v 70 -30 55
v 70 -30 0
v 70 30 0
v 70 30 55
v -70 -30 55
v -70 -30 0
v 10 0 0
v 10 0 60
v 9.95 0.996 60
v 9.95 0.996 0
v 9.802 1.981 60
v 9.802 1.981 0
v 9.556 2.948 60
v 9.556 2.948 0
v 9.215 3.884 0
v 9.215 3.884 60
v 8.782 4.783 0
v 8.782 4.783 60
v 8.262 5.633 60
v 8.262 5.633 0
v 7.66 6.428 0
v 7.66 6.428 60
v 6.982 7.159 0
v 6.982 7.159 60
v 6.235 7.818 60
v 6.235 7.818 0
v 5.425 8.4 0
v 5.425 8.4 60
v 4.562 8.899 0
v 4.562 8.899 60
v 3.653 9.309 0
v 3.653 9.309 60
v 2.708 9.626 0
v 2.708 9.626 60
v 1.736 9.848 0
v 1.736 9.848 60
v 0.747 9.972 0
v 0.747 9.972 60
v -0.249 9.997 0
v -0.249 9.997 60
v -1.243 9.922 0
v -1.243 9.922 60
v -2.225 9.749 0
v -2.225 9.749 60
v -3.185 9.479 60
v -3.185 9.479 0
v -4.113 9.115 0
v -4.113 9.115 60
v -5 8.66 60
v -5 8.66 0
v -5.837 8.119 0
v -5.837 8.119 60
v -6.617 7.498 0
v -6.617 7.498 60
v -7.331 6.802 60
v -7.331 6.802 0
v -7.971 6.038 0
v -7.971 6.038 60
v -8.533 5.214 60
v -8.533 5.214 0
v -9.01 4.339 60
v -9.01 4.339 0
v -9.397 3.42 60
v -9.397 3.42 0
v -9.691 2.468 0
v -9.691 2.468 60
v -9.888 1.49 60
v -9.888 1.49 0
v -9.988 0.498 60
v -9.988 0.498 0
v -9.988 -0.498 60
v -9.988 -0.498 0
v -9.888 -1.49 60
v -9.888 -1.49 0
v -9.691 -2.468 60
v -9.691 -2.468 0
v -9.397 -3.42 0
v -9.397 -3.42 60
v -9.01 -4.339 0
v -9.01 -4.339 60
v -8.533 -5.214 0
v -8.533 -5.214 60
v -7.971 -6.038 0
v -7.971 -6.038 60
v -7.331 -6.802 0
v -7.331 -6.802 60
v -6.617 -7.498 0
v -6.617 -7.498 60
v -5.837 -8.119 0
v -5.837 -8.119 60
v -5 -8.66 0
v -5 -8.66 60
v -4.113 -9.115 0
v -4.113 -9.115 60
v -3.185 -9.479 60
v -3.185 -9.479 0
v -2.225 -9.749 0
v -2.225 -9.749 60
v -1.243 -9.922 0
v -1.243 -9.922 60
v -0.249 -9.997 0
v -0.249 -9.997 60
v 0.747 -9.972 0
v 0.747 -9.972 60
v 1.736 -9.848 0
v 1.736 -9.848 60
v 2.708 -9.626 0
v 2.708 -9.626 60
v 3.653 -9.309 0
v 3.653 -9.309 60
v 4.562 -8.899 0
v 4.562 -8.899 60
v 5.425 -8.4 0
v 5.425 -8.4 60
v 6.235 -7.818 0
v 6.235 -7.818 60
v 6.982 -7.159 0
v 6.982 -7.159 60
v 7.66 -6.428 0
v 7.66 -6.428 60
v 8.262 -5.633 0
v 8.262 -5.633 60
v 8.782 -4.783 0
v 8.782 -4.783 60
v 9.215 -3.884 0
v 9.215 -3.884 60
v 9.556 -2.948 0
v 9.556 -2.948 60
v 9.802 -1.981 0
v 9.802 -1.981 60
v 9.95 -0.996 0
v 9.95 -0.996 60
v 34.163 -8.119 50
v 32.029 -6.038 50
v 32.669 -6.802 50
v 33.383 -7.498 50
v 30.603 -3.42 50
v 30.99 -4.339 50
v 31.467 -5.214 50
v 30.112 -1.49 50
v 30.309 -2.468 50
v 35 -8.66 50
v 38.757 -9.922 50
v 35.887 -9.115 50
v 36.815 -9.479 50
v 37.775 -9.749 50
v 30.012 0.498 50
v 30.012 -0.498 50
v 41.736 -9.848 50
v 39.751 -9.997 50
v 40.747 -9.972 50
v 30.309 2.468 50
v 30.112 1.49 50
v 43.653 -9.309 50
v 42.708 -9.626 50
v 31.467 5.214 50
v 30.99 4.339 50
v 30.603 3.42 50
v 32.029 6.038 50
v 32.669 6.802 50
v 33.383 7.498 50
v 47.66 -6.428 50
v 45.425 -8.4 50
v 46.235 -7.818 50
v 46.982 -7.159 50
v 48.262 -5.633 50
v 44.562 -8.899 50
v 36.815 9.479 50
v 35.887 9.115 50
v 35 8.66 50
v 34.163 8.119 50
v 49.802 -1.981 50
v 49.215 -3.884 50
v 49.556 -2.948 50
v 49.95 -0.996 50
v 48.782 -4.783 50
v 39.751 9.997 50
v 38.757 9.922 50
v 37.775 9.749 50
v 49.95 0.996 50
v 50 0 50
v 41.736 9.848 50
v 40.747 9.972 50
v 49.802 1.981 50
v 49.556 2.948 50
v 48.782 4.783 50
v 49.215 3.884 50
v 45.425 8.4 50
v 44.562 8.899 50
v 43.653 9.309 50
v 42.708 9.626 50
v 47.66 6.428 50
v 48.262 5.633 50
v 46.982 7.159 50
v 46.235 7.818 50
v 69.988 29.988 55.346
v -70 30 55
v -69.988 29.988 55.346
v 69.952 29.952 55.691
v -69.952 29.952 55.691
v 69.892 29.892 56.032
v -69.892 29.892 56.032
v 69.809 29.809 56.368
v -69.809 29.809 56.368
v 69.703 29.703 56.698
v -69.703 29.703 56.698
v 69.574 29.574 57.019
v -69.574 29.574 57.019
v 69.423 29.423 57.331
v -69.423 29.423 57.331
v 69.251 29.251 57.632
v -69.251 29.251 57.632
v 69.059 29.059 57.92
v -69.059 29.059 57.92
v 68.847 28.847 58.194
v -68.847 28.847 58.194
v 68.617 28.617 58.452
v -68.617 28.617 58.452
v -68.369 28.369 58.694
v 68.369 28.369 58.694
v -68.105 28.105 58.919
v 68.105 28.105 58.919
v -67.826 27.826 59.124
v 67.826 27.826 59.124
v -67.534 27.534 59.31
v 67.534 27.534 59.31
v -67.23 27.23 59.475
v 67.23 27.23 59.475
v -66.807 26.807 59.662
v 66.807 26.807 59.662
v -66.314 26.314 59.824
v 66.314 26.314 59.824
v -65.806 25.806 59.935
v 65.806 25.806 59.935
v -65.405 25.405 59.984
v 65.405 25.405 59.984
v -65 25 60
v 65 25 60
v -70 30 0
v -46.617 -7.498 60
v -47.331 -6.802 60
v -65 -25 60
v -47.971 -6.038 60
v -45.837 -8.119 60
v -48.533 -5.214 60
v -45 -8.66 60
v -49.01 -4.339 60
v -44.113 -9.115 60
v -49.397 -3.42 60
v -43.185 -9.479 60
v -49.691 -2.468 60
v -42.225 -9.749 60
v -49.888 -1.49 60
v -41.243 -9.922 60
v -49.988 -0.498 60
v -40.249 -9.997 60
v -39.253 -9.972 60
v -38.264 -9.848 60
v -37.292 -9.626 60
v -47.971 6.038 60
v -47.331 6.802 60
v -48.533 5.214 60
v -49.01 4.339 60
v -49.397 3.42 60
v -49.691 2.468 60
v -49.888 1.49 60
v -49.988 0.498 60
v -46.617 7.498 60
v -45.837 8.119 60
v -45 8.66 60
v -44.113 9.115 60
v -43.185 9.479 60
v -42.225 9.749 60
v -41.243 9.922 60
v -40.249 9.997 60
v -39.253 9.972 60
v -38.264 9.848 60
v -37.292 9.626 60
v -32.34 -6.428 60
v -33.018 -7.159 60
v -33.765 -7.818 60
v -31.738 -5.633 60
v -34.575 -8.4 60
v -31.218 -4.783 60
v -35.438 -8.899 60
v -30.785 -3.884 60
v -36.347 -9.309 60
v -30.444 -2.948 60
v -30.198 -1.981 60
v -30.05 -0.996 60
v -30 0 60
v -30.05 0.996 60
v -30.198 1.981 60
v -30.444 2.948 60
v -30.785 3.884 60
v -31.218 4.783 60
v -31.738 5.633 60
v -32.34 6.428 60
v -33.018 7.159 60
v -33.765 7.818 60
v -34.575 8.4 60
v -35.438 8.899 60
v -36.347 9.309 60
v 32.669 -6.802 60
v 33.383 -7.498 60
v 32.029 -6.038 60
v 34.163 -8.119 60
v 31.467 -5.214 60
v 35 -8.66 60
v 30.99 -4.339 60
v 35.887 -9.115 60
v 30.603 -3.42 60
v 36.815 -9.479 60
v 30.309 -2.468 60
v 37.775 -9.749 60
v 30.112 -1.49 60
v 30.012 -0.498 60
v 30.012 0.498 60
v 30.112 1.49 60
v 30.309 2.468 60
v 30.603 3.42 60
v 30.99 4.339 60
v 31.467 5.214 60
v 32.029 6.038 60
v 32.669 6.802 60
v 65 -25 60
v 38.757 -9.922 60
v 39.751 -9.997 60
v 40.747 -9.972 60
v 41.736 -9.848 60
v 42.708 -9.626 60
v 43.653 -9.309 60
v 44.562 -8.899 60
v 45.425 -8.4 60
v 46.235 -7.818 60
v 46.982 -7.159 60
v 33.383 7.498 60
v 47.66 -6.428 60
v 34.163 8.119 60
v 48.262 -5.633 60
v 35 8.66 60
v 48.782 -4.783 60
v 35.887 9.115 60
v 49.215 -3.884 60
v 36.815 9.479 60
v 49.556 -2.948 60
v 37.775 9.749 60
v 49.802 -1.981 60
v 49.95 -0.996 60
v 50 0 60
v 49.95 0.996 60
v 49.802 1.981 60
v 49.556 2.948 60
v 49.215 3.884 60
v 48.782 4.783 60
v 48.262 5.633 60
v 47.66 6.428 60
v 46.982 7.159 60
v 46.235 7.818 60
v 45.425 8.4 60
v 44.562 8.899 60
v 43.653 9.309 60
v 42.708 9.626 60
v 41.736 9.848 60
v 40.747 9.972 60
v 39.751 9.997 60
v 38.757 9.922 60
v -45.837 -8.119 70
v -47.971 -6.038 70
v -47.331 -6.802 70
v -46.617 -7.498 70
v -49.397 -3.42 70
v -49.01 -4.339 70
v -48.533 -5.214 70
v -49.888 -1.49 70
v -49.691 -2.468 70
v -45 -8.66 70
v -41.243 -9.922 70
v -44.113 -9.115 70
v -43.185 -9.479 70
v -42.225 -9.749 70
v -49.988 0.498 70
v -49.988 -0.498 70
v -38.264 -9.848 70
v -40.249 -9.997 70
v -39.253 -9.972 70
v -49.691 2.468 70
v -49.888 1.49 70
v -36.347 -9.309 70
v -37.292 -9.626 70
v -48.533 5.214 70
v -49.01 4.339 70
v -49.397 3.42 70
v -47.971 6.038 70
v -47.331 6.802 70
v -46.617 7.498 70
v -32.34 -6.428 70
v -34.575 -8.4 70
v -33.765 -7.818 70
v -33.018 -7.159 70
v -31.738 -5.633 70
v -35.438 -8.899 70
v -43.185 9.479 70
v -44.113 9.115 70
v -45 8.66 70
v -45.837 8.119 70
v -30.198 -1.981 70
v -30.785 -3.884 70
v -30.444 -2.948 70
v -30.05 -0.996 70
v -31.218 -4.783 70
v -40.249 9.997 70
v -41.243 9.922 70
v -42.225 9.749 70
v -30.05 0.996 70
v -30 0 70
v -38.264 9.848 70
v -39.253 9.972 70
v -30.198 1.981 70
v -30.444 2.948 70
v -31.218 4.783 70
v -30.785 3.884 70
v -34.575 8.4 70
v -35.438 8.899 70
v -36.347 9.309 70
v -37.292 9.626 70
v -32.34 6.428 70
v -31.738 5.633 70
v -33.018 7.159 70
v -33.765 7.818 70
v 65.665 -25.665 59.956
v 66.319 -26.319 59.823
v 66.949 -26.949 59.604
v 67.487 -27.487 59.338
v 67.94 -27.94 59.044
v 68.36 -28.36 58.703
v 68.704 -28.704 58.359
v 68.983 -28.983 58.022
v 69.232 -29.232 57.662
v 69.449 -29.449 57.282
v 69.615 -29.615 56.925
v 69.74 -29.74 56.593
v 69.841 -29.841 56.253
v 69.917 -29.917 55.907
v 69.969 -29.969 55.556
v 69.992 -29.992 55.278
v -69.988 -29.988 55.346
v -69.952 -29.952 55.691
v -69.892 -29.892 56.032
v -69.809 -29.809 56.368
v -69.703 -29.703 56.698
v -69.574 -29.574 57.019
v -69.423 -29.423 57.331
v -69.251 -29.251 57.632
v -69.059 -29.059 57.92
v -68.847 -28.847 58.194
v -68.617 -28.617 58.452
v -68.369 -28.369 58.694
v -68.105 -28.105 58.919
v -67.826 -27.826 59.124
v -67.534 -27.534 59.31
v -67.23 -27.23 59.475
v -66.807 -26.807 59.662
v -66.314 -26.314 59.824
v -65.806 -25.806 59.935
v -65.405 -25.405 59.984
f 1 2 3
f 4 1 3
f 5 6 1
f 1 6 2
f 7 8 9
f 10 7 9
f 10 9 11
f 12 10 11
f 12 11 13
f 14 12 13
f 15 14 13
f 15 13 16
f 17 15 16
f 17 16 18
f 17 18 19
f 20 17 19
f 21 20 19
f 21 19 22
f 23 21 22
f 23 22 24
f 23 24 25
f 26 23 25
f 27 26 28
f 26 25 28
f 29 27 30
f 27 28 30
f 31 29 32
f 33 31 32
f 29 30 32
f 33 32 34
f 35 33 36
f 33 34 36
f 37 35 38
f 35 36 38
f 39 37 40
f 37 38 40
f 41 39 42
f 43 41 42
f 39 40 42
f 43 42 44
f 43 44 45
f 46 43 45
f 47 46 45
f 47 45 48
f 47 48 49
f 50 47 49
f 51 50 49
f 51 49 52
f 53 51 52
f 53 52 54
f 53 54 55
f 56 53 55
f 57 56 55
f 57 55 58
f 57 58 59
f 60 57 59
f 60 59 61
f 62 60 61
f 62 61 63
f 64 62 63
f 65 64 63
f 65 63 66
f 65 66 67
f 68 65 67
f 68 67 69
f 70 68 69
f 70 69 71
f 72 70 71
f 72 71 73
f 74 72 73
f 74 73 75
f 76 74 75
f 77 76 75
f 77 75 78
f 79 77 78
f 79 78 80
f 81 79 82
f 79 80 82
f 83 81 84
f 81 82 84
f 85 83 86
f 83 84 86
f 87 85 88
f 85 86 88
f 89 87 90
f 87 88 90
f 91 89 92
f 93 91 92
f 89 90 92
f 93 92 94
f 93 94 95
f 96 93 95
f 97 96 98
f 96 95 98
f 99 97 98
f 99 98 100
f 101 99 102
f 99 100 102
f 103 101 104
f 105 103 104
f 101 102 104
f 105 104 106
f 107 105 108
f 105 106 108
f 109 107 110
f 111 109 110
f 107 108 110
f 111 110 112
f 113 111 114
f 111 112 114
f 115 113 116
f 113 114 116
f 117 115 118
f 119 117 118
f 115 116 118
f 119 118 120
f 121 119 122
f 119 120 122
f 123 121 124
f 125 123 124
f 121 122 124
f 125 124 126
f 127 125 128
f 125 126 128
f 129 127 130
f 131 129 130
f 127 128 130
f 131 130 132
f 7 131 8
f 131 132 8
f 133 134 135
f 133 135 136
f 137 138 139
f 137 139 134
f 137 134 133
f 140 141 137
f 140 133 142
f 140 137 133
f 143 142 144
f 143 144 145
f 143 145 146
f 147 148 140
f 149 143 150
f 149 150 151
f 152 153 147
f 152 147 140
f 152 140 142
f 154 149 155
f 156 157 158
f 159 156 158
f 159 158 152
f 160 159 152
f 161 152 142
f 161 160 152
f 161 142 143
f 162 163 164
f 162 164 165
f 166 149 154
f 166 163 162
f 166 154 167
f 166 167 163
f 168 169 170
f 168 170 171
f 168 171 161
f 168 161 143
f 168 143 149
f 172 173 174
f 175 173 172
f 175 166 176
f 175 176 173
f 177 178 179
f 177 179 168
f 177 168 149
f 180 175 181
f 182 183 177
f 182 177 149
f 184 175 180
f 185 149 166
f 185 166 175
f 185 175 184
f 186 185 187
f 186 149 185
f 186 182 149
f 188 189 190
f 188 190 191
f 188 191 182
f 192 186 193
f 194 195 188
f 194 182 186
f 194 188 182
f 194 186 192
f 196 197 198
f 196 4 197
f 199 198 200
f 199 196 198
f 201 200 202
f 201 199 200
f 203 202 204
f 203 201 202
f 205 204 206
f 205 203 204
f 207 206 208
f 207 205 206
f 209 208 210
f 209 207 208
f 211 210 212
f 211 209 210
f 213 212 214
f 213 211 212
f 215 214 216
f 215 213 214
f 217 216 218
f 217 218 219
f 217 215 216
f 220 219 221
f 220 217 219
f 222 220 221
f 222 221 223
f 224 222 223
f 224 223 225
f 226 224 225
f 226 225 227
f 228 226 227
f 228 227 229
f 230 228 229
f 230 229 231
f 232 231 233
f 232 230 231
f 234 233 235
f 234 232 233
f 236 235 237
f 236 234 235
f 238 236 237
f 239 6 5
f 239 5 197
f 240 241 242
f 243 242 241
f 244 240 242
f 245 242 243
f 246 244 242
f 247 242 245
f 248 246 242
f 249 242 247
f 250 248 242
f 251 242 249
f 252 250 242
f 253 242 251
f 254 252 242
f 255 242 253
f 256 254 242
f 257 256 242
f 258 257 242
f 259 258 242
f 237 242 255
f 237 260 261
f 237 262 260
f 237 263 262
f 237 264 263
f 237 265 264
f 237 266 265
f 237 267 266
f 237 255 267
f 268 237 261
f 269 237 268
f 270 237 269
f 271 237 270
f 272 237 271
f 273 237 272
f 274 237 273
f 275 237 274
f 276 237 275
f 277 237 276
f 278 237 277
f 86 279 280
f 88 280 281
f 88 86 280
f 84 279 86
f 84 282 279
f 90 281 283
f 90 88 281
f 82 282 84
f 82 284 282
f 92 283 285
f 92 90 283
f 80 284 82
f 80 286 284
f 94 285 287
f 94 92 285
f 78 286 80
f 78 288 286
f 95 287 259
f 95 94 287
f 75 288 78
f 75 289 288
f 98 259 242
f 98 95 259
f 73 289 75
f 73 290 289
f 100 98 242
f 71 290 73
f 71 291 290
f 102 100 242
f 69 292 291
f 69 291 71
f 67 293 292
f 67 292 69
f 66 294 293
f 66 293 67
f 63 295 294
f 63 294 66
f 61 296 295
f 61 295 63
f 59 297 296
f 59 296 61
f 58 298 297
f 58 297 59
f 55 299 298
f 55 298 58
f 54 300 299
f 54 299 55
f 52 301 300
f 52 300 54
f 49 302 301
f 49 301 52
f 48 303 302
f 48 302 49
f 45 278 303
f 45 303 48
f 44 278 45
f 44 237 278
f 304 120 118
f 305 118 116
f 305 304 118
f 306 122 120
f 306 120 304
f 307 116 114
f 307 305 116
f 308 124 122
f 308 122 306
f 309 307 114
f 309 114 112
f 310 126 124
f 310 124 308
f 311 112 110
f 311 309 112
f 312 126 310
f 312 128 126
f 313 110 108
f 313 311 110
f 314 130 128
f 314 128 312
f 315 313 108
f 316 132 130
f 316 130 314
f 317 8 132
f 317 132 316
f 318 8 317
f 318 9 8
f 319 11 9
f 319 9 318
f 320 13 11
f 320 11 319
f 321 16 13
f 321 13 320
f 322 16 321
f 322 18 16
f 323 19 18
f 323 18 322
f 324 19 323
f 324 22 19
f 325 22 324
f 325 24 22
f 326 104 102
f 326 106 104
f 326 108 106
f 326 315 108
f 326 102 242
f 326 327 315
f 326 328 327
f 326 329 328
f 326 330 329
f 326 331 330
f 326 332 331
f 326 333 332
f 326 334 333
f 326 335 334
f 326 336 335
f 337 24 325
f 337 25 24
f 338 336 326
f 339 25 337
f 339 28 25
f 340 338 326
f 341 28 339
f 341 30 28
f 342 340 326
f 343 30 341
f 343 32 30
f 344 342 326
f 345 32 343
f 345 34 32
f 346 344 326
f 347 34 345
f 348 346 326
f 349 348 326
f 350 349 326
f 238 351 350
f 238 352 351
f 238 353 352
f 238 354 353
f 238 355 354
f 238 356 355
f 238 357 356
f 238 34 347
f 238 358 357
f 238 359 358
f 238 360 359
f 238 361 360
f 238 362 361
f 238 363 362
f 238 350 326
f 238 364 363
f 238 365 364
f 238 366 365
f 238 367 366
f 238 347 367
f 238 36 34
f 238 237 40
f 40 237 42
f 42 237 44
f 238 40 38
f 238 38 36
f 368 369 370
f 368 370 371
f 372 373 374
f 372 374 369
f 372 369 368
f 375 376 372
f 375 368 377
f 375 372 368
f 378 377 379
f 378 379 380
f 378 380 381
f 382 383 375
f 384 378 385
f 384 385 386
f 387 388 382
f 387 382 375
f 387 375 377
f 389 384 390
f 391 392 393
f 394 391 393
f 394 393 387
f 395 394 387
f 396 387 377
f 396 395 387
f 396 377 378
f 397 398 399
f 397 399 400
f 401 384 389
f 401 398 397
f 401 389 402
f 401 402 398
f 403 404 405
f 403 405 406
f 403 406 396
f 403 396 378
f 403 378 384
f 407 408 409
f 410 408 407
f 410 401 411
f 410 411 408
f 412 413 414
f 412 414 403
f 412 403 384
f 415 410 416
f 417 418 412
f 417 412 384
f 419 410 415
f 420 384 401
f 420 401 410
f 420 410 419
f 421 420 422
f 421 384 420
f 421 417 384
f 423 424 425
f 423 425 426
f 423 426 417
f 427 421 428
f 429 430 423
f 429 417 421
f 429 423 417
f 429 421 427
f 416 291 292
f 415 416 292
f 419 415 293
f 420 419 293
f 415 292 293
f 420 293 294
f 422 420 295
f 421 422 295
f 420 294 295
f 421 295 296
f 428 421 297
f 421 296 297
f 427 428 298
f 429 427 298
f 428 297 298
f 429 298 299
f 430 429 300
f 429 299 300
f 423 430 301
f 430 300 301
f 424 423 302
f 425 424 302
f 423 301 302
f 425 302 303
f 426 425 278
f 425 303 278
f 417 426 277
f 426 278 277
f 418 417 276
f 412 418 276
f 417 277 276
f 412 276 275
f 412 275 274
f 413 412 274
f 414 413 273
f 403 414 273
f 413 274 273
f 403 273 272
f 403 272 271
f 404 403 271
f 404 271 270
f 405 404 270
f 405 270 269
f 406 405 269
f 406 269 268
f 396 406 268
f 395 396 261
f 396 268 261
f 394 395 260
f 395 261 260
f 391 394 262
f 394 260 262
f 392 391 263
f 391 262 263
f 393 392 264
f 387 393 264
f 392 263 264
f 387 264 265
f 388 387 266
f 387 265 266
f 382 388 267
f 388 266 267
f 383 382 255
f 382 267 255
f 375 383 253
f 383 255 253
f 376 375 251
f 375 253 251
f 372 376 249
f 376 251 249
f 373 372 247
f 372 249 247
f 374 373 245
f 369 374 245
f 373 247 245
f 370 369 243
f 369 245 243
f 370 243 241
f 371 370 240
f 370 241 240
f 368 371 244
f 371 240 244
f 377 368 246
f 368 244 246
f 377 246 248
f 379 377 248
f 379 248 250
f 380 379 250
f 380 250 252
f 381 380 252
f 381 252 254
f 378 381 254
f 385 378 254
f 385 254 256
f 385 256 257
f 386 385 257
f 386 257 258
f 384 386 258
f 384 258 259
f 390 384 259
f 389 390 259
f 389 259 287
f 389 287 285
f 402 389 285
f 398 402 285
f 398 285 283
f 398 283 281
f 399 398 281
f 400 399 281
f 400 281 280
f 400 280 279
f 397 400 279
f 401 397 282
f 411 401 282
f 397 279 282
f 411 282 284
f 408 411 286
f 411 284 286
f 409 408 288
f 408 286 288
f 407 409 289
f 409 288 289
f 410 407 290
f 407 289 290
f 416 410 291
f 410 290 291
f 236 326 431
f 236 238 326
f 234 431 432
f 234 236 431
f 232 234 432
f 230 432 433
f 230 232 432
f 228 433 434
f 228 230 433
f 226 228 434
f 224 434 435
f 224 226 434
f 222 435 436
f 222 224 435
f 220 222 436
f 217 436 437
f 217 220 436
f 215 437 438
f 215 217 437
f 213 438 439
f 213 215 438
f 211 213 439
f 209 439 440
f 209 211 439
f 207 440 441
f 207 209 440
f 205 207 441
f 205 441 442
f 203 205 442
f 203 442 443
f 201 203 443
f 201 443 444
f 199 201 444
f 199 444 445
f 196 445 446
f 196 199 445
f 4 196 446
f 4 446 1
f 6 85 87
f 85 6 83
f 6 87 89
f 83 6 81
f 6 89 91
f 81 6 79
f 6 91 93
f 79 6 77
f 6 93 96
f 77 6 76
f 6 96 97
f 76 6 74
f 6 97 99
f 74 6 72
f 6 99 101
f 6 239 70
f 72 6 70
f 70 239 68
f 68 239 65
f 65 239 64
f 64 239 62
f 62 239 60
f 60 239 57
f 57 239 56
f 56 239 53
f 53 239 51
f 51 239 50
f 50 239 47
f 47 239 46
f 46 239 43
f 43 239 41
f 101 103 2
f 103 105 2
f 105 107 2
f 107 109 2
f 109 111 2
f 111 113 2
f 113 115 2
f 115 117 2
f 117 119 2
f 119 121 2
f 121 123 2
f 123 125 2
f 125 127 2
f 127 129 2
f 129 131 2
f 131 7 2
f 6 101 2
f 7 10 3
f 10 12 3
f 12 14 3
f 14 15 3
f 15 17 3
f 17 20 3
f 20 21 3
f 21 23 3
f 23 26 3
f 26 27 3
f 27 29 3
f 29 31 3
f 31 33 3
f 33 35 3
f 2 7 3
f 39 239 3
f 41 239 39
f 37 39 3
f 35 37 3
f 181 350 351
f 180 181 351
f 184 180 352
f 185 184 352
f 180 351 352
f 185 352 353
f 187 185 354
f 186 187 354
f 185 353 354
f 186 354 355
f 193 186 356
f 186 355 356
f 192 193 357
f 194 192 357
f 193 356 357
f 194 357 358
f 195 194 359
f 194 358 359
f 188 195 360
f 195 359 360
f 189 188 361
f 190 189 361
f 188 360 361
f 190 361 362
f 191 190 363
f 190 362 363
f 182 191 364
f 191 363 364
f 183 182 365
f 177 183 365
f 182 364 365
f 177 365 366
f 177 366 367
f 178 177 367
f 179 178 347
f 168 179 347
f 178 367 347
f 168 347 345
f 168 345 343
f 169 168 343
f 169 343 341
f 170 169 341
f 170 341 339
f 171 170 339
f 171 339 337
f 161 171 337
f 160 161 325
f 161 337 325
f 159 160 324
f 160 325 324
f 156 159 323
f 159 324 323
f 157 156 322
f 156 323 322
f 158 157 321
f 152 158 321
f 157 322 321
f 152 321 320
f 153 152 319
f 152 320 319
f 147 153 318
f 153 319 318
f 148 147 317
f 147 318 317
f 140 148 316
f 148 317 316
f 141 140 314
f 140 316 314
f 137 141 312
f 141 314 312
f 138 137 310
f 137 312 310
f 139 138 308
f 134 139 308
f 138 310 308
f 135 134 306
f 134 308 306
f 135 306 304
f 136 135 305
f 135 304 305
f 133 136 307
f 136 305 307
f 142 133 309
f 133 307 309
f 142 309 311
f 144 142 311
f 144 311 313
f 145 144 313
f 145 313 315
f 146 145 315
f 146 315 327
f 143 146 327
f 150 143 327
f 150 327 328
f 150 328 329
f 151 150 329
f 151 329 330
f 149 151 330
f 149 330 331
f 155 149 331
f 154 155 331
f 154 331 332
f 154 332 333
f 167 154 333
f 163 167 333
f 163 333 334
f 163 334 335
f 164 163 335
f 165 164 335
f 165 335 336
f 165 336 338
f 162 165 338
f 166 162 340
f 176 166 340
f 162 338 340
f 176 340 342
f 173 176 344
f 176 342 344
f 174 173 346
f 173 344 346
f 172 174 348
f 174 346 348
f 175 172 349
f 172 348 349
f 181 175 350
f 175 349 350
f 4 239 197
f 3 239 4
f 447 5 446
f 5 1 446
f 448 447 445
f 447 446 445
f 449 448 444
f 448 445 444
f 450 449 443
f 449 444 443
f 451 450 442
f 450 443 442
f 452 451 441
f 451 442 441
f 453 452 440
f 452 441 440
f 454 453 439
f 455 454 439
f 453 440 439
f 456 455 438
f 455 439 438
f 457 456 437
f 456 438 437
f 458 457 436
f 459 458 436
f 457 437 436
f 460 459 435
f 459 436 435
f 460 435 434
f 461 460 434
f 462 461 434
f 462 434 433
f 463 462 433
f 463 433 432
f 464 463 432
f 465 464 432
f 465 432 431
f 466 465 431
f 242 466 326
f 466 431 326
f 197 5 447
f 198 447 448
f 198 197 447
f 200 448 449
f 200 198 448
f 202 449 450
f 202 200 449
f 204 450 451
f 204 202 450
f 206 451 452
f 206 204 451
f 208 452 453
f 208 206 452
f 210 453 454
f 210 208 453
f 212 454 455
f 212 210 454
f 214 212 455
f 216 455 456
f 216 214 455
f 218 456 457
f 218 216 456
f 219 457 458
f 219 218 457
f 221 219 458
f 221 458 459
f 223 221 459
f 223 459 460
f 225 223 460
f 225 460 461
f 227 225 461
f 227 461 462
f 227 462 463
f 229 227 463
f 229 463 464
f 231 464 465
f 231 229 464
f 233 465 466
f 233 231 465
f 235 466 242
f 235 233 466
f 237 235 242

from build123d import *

# Parameters (mm, degrees)
F0_W     = 140
F0_H     = 60
F1_DEPTH = 60
F2_R     = 10
F5_DEPTH = 10
F3_R     = 10
F6_DEPTH = 10
F4_R     = 10
F7_DEPTH = 109.5
F8_R     = 5


with BuildPart() as f1:
    # F0 (on Top) → F1 (new body)
    with BuildSketch(Plane.XY):
        Rectangle(F0_W, F0_H)
    extrude(amount=F1_DEPTH)

    # F2 (on face) → F5 (join)
    with BuildSketch(Plane.XY.offset(60)):
        with Locations((-40, 0)):
            Circle(F2_R)
    extrude(amount=F5_DEPTH)

    # F3 (on face) → F6 (cut)
    with BuildSketch(Plane.XY.offset(60)):
        with Locations((40, 0)):
            Circle(F3_R)
    extrude(amount=-F6_DEPTH, mode=Mode.SUBTRACT)

    # F4 (on face) → F7 (cut)
    with BuildSketch(Plane.XY.offset(60)):
        Circle(F4_R)
    extrude(amount=-F7_DEPTH, mode=Mode.SUBTRACT)

    # F8
    f8_edges = [f1.edges().sort_by_distance(p)[0] for p in [
        (-70, 0, 60),
        (0, 30, 60),
        (70, 0, 60),
        (0, -30, 60),
    ]]
    fillet(f8_edges, radius=F8_R)


solid = f1.part
